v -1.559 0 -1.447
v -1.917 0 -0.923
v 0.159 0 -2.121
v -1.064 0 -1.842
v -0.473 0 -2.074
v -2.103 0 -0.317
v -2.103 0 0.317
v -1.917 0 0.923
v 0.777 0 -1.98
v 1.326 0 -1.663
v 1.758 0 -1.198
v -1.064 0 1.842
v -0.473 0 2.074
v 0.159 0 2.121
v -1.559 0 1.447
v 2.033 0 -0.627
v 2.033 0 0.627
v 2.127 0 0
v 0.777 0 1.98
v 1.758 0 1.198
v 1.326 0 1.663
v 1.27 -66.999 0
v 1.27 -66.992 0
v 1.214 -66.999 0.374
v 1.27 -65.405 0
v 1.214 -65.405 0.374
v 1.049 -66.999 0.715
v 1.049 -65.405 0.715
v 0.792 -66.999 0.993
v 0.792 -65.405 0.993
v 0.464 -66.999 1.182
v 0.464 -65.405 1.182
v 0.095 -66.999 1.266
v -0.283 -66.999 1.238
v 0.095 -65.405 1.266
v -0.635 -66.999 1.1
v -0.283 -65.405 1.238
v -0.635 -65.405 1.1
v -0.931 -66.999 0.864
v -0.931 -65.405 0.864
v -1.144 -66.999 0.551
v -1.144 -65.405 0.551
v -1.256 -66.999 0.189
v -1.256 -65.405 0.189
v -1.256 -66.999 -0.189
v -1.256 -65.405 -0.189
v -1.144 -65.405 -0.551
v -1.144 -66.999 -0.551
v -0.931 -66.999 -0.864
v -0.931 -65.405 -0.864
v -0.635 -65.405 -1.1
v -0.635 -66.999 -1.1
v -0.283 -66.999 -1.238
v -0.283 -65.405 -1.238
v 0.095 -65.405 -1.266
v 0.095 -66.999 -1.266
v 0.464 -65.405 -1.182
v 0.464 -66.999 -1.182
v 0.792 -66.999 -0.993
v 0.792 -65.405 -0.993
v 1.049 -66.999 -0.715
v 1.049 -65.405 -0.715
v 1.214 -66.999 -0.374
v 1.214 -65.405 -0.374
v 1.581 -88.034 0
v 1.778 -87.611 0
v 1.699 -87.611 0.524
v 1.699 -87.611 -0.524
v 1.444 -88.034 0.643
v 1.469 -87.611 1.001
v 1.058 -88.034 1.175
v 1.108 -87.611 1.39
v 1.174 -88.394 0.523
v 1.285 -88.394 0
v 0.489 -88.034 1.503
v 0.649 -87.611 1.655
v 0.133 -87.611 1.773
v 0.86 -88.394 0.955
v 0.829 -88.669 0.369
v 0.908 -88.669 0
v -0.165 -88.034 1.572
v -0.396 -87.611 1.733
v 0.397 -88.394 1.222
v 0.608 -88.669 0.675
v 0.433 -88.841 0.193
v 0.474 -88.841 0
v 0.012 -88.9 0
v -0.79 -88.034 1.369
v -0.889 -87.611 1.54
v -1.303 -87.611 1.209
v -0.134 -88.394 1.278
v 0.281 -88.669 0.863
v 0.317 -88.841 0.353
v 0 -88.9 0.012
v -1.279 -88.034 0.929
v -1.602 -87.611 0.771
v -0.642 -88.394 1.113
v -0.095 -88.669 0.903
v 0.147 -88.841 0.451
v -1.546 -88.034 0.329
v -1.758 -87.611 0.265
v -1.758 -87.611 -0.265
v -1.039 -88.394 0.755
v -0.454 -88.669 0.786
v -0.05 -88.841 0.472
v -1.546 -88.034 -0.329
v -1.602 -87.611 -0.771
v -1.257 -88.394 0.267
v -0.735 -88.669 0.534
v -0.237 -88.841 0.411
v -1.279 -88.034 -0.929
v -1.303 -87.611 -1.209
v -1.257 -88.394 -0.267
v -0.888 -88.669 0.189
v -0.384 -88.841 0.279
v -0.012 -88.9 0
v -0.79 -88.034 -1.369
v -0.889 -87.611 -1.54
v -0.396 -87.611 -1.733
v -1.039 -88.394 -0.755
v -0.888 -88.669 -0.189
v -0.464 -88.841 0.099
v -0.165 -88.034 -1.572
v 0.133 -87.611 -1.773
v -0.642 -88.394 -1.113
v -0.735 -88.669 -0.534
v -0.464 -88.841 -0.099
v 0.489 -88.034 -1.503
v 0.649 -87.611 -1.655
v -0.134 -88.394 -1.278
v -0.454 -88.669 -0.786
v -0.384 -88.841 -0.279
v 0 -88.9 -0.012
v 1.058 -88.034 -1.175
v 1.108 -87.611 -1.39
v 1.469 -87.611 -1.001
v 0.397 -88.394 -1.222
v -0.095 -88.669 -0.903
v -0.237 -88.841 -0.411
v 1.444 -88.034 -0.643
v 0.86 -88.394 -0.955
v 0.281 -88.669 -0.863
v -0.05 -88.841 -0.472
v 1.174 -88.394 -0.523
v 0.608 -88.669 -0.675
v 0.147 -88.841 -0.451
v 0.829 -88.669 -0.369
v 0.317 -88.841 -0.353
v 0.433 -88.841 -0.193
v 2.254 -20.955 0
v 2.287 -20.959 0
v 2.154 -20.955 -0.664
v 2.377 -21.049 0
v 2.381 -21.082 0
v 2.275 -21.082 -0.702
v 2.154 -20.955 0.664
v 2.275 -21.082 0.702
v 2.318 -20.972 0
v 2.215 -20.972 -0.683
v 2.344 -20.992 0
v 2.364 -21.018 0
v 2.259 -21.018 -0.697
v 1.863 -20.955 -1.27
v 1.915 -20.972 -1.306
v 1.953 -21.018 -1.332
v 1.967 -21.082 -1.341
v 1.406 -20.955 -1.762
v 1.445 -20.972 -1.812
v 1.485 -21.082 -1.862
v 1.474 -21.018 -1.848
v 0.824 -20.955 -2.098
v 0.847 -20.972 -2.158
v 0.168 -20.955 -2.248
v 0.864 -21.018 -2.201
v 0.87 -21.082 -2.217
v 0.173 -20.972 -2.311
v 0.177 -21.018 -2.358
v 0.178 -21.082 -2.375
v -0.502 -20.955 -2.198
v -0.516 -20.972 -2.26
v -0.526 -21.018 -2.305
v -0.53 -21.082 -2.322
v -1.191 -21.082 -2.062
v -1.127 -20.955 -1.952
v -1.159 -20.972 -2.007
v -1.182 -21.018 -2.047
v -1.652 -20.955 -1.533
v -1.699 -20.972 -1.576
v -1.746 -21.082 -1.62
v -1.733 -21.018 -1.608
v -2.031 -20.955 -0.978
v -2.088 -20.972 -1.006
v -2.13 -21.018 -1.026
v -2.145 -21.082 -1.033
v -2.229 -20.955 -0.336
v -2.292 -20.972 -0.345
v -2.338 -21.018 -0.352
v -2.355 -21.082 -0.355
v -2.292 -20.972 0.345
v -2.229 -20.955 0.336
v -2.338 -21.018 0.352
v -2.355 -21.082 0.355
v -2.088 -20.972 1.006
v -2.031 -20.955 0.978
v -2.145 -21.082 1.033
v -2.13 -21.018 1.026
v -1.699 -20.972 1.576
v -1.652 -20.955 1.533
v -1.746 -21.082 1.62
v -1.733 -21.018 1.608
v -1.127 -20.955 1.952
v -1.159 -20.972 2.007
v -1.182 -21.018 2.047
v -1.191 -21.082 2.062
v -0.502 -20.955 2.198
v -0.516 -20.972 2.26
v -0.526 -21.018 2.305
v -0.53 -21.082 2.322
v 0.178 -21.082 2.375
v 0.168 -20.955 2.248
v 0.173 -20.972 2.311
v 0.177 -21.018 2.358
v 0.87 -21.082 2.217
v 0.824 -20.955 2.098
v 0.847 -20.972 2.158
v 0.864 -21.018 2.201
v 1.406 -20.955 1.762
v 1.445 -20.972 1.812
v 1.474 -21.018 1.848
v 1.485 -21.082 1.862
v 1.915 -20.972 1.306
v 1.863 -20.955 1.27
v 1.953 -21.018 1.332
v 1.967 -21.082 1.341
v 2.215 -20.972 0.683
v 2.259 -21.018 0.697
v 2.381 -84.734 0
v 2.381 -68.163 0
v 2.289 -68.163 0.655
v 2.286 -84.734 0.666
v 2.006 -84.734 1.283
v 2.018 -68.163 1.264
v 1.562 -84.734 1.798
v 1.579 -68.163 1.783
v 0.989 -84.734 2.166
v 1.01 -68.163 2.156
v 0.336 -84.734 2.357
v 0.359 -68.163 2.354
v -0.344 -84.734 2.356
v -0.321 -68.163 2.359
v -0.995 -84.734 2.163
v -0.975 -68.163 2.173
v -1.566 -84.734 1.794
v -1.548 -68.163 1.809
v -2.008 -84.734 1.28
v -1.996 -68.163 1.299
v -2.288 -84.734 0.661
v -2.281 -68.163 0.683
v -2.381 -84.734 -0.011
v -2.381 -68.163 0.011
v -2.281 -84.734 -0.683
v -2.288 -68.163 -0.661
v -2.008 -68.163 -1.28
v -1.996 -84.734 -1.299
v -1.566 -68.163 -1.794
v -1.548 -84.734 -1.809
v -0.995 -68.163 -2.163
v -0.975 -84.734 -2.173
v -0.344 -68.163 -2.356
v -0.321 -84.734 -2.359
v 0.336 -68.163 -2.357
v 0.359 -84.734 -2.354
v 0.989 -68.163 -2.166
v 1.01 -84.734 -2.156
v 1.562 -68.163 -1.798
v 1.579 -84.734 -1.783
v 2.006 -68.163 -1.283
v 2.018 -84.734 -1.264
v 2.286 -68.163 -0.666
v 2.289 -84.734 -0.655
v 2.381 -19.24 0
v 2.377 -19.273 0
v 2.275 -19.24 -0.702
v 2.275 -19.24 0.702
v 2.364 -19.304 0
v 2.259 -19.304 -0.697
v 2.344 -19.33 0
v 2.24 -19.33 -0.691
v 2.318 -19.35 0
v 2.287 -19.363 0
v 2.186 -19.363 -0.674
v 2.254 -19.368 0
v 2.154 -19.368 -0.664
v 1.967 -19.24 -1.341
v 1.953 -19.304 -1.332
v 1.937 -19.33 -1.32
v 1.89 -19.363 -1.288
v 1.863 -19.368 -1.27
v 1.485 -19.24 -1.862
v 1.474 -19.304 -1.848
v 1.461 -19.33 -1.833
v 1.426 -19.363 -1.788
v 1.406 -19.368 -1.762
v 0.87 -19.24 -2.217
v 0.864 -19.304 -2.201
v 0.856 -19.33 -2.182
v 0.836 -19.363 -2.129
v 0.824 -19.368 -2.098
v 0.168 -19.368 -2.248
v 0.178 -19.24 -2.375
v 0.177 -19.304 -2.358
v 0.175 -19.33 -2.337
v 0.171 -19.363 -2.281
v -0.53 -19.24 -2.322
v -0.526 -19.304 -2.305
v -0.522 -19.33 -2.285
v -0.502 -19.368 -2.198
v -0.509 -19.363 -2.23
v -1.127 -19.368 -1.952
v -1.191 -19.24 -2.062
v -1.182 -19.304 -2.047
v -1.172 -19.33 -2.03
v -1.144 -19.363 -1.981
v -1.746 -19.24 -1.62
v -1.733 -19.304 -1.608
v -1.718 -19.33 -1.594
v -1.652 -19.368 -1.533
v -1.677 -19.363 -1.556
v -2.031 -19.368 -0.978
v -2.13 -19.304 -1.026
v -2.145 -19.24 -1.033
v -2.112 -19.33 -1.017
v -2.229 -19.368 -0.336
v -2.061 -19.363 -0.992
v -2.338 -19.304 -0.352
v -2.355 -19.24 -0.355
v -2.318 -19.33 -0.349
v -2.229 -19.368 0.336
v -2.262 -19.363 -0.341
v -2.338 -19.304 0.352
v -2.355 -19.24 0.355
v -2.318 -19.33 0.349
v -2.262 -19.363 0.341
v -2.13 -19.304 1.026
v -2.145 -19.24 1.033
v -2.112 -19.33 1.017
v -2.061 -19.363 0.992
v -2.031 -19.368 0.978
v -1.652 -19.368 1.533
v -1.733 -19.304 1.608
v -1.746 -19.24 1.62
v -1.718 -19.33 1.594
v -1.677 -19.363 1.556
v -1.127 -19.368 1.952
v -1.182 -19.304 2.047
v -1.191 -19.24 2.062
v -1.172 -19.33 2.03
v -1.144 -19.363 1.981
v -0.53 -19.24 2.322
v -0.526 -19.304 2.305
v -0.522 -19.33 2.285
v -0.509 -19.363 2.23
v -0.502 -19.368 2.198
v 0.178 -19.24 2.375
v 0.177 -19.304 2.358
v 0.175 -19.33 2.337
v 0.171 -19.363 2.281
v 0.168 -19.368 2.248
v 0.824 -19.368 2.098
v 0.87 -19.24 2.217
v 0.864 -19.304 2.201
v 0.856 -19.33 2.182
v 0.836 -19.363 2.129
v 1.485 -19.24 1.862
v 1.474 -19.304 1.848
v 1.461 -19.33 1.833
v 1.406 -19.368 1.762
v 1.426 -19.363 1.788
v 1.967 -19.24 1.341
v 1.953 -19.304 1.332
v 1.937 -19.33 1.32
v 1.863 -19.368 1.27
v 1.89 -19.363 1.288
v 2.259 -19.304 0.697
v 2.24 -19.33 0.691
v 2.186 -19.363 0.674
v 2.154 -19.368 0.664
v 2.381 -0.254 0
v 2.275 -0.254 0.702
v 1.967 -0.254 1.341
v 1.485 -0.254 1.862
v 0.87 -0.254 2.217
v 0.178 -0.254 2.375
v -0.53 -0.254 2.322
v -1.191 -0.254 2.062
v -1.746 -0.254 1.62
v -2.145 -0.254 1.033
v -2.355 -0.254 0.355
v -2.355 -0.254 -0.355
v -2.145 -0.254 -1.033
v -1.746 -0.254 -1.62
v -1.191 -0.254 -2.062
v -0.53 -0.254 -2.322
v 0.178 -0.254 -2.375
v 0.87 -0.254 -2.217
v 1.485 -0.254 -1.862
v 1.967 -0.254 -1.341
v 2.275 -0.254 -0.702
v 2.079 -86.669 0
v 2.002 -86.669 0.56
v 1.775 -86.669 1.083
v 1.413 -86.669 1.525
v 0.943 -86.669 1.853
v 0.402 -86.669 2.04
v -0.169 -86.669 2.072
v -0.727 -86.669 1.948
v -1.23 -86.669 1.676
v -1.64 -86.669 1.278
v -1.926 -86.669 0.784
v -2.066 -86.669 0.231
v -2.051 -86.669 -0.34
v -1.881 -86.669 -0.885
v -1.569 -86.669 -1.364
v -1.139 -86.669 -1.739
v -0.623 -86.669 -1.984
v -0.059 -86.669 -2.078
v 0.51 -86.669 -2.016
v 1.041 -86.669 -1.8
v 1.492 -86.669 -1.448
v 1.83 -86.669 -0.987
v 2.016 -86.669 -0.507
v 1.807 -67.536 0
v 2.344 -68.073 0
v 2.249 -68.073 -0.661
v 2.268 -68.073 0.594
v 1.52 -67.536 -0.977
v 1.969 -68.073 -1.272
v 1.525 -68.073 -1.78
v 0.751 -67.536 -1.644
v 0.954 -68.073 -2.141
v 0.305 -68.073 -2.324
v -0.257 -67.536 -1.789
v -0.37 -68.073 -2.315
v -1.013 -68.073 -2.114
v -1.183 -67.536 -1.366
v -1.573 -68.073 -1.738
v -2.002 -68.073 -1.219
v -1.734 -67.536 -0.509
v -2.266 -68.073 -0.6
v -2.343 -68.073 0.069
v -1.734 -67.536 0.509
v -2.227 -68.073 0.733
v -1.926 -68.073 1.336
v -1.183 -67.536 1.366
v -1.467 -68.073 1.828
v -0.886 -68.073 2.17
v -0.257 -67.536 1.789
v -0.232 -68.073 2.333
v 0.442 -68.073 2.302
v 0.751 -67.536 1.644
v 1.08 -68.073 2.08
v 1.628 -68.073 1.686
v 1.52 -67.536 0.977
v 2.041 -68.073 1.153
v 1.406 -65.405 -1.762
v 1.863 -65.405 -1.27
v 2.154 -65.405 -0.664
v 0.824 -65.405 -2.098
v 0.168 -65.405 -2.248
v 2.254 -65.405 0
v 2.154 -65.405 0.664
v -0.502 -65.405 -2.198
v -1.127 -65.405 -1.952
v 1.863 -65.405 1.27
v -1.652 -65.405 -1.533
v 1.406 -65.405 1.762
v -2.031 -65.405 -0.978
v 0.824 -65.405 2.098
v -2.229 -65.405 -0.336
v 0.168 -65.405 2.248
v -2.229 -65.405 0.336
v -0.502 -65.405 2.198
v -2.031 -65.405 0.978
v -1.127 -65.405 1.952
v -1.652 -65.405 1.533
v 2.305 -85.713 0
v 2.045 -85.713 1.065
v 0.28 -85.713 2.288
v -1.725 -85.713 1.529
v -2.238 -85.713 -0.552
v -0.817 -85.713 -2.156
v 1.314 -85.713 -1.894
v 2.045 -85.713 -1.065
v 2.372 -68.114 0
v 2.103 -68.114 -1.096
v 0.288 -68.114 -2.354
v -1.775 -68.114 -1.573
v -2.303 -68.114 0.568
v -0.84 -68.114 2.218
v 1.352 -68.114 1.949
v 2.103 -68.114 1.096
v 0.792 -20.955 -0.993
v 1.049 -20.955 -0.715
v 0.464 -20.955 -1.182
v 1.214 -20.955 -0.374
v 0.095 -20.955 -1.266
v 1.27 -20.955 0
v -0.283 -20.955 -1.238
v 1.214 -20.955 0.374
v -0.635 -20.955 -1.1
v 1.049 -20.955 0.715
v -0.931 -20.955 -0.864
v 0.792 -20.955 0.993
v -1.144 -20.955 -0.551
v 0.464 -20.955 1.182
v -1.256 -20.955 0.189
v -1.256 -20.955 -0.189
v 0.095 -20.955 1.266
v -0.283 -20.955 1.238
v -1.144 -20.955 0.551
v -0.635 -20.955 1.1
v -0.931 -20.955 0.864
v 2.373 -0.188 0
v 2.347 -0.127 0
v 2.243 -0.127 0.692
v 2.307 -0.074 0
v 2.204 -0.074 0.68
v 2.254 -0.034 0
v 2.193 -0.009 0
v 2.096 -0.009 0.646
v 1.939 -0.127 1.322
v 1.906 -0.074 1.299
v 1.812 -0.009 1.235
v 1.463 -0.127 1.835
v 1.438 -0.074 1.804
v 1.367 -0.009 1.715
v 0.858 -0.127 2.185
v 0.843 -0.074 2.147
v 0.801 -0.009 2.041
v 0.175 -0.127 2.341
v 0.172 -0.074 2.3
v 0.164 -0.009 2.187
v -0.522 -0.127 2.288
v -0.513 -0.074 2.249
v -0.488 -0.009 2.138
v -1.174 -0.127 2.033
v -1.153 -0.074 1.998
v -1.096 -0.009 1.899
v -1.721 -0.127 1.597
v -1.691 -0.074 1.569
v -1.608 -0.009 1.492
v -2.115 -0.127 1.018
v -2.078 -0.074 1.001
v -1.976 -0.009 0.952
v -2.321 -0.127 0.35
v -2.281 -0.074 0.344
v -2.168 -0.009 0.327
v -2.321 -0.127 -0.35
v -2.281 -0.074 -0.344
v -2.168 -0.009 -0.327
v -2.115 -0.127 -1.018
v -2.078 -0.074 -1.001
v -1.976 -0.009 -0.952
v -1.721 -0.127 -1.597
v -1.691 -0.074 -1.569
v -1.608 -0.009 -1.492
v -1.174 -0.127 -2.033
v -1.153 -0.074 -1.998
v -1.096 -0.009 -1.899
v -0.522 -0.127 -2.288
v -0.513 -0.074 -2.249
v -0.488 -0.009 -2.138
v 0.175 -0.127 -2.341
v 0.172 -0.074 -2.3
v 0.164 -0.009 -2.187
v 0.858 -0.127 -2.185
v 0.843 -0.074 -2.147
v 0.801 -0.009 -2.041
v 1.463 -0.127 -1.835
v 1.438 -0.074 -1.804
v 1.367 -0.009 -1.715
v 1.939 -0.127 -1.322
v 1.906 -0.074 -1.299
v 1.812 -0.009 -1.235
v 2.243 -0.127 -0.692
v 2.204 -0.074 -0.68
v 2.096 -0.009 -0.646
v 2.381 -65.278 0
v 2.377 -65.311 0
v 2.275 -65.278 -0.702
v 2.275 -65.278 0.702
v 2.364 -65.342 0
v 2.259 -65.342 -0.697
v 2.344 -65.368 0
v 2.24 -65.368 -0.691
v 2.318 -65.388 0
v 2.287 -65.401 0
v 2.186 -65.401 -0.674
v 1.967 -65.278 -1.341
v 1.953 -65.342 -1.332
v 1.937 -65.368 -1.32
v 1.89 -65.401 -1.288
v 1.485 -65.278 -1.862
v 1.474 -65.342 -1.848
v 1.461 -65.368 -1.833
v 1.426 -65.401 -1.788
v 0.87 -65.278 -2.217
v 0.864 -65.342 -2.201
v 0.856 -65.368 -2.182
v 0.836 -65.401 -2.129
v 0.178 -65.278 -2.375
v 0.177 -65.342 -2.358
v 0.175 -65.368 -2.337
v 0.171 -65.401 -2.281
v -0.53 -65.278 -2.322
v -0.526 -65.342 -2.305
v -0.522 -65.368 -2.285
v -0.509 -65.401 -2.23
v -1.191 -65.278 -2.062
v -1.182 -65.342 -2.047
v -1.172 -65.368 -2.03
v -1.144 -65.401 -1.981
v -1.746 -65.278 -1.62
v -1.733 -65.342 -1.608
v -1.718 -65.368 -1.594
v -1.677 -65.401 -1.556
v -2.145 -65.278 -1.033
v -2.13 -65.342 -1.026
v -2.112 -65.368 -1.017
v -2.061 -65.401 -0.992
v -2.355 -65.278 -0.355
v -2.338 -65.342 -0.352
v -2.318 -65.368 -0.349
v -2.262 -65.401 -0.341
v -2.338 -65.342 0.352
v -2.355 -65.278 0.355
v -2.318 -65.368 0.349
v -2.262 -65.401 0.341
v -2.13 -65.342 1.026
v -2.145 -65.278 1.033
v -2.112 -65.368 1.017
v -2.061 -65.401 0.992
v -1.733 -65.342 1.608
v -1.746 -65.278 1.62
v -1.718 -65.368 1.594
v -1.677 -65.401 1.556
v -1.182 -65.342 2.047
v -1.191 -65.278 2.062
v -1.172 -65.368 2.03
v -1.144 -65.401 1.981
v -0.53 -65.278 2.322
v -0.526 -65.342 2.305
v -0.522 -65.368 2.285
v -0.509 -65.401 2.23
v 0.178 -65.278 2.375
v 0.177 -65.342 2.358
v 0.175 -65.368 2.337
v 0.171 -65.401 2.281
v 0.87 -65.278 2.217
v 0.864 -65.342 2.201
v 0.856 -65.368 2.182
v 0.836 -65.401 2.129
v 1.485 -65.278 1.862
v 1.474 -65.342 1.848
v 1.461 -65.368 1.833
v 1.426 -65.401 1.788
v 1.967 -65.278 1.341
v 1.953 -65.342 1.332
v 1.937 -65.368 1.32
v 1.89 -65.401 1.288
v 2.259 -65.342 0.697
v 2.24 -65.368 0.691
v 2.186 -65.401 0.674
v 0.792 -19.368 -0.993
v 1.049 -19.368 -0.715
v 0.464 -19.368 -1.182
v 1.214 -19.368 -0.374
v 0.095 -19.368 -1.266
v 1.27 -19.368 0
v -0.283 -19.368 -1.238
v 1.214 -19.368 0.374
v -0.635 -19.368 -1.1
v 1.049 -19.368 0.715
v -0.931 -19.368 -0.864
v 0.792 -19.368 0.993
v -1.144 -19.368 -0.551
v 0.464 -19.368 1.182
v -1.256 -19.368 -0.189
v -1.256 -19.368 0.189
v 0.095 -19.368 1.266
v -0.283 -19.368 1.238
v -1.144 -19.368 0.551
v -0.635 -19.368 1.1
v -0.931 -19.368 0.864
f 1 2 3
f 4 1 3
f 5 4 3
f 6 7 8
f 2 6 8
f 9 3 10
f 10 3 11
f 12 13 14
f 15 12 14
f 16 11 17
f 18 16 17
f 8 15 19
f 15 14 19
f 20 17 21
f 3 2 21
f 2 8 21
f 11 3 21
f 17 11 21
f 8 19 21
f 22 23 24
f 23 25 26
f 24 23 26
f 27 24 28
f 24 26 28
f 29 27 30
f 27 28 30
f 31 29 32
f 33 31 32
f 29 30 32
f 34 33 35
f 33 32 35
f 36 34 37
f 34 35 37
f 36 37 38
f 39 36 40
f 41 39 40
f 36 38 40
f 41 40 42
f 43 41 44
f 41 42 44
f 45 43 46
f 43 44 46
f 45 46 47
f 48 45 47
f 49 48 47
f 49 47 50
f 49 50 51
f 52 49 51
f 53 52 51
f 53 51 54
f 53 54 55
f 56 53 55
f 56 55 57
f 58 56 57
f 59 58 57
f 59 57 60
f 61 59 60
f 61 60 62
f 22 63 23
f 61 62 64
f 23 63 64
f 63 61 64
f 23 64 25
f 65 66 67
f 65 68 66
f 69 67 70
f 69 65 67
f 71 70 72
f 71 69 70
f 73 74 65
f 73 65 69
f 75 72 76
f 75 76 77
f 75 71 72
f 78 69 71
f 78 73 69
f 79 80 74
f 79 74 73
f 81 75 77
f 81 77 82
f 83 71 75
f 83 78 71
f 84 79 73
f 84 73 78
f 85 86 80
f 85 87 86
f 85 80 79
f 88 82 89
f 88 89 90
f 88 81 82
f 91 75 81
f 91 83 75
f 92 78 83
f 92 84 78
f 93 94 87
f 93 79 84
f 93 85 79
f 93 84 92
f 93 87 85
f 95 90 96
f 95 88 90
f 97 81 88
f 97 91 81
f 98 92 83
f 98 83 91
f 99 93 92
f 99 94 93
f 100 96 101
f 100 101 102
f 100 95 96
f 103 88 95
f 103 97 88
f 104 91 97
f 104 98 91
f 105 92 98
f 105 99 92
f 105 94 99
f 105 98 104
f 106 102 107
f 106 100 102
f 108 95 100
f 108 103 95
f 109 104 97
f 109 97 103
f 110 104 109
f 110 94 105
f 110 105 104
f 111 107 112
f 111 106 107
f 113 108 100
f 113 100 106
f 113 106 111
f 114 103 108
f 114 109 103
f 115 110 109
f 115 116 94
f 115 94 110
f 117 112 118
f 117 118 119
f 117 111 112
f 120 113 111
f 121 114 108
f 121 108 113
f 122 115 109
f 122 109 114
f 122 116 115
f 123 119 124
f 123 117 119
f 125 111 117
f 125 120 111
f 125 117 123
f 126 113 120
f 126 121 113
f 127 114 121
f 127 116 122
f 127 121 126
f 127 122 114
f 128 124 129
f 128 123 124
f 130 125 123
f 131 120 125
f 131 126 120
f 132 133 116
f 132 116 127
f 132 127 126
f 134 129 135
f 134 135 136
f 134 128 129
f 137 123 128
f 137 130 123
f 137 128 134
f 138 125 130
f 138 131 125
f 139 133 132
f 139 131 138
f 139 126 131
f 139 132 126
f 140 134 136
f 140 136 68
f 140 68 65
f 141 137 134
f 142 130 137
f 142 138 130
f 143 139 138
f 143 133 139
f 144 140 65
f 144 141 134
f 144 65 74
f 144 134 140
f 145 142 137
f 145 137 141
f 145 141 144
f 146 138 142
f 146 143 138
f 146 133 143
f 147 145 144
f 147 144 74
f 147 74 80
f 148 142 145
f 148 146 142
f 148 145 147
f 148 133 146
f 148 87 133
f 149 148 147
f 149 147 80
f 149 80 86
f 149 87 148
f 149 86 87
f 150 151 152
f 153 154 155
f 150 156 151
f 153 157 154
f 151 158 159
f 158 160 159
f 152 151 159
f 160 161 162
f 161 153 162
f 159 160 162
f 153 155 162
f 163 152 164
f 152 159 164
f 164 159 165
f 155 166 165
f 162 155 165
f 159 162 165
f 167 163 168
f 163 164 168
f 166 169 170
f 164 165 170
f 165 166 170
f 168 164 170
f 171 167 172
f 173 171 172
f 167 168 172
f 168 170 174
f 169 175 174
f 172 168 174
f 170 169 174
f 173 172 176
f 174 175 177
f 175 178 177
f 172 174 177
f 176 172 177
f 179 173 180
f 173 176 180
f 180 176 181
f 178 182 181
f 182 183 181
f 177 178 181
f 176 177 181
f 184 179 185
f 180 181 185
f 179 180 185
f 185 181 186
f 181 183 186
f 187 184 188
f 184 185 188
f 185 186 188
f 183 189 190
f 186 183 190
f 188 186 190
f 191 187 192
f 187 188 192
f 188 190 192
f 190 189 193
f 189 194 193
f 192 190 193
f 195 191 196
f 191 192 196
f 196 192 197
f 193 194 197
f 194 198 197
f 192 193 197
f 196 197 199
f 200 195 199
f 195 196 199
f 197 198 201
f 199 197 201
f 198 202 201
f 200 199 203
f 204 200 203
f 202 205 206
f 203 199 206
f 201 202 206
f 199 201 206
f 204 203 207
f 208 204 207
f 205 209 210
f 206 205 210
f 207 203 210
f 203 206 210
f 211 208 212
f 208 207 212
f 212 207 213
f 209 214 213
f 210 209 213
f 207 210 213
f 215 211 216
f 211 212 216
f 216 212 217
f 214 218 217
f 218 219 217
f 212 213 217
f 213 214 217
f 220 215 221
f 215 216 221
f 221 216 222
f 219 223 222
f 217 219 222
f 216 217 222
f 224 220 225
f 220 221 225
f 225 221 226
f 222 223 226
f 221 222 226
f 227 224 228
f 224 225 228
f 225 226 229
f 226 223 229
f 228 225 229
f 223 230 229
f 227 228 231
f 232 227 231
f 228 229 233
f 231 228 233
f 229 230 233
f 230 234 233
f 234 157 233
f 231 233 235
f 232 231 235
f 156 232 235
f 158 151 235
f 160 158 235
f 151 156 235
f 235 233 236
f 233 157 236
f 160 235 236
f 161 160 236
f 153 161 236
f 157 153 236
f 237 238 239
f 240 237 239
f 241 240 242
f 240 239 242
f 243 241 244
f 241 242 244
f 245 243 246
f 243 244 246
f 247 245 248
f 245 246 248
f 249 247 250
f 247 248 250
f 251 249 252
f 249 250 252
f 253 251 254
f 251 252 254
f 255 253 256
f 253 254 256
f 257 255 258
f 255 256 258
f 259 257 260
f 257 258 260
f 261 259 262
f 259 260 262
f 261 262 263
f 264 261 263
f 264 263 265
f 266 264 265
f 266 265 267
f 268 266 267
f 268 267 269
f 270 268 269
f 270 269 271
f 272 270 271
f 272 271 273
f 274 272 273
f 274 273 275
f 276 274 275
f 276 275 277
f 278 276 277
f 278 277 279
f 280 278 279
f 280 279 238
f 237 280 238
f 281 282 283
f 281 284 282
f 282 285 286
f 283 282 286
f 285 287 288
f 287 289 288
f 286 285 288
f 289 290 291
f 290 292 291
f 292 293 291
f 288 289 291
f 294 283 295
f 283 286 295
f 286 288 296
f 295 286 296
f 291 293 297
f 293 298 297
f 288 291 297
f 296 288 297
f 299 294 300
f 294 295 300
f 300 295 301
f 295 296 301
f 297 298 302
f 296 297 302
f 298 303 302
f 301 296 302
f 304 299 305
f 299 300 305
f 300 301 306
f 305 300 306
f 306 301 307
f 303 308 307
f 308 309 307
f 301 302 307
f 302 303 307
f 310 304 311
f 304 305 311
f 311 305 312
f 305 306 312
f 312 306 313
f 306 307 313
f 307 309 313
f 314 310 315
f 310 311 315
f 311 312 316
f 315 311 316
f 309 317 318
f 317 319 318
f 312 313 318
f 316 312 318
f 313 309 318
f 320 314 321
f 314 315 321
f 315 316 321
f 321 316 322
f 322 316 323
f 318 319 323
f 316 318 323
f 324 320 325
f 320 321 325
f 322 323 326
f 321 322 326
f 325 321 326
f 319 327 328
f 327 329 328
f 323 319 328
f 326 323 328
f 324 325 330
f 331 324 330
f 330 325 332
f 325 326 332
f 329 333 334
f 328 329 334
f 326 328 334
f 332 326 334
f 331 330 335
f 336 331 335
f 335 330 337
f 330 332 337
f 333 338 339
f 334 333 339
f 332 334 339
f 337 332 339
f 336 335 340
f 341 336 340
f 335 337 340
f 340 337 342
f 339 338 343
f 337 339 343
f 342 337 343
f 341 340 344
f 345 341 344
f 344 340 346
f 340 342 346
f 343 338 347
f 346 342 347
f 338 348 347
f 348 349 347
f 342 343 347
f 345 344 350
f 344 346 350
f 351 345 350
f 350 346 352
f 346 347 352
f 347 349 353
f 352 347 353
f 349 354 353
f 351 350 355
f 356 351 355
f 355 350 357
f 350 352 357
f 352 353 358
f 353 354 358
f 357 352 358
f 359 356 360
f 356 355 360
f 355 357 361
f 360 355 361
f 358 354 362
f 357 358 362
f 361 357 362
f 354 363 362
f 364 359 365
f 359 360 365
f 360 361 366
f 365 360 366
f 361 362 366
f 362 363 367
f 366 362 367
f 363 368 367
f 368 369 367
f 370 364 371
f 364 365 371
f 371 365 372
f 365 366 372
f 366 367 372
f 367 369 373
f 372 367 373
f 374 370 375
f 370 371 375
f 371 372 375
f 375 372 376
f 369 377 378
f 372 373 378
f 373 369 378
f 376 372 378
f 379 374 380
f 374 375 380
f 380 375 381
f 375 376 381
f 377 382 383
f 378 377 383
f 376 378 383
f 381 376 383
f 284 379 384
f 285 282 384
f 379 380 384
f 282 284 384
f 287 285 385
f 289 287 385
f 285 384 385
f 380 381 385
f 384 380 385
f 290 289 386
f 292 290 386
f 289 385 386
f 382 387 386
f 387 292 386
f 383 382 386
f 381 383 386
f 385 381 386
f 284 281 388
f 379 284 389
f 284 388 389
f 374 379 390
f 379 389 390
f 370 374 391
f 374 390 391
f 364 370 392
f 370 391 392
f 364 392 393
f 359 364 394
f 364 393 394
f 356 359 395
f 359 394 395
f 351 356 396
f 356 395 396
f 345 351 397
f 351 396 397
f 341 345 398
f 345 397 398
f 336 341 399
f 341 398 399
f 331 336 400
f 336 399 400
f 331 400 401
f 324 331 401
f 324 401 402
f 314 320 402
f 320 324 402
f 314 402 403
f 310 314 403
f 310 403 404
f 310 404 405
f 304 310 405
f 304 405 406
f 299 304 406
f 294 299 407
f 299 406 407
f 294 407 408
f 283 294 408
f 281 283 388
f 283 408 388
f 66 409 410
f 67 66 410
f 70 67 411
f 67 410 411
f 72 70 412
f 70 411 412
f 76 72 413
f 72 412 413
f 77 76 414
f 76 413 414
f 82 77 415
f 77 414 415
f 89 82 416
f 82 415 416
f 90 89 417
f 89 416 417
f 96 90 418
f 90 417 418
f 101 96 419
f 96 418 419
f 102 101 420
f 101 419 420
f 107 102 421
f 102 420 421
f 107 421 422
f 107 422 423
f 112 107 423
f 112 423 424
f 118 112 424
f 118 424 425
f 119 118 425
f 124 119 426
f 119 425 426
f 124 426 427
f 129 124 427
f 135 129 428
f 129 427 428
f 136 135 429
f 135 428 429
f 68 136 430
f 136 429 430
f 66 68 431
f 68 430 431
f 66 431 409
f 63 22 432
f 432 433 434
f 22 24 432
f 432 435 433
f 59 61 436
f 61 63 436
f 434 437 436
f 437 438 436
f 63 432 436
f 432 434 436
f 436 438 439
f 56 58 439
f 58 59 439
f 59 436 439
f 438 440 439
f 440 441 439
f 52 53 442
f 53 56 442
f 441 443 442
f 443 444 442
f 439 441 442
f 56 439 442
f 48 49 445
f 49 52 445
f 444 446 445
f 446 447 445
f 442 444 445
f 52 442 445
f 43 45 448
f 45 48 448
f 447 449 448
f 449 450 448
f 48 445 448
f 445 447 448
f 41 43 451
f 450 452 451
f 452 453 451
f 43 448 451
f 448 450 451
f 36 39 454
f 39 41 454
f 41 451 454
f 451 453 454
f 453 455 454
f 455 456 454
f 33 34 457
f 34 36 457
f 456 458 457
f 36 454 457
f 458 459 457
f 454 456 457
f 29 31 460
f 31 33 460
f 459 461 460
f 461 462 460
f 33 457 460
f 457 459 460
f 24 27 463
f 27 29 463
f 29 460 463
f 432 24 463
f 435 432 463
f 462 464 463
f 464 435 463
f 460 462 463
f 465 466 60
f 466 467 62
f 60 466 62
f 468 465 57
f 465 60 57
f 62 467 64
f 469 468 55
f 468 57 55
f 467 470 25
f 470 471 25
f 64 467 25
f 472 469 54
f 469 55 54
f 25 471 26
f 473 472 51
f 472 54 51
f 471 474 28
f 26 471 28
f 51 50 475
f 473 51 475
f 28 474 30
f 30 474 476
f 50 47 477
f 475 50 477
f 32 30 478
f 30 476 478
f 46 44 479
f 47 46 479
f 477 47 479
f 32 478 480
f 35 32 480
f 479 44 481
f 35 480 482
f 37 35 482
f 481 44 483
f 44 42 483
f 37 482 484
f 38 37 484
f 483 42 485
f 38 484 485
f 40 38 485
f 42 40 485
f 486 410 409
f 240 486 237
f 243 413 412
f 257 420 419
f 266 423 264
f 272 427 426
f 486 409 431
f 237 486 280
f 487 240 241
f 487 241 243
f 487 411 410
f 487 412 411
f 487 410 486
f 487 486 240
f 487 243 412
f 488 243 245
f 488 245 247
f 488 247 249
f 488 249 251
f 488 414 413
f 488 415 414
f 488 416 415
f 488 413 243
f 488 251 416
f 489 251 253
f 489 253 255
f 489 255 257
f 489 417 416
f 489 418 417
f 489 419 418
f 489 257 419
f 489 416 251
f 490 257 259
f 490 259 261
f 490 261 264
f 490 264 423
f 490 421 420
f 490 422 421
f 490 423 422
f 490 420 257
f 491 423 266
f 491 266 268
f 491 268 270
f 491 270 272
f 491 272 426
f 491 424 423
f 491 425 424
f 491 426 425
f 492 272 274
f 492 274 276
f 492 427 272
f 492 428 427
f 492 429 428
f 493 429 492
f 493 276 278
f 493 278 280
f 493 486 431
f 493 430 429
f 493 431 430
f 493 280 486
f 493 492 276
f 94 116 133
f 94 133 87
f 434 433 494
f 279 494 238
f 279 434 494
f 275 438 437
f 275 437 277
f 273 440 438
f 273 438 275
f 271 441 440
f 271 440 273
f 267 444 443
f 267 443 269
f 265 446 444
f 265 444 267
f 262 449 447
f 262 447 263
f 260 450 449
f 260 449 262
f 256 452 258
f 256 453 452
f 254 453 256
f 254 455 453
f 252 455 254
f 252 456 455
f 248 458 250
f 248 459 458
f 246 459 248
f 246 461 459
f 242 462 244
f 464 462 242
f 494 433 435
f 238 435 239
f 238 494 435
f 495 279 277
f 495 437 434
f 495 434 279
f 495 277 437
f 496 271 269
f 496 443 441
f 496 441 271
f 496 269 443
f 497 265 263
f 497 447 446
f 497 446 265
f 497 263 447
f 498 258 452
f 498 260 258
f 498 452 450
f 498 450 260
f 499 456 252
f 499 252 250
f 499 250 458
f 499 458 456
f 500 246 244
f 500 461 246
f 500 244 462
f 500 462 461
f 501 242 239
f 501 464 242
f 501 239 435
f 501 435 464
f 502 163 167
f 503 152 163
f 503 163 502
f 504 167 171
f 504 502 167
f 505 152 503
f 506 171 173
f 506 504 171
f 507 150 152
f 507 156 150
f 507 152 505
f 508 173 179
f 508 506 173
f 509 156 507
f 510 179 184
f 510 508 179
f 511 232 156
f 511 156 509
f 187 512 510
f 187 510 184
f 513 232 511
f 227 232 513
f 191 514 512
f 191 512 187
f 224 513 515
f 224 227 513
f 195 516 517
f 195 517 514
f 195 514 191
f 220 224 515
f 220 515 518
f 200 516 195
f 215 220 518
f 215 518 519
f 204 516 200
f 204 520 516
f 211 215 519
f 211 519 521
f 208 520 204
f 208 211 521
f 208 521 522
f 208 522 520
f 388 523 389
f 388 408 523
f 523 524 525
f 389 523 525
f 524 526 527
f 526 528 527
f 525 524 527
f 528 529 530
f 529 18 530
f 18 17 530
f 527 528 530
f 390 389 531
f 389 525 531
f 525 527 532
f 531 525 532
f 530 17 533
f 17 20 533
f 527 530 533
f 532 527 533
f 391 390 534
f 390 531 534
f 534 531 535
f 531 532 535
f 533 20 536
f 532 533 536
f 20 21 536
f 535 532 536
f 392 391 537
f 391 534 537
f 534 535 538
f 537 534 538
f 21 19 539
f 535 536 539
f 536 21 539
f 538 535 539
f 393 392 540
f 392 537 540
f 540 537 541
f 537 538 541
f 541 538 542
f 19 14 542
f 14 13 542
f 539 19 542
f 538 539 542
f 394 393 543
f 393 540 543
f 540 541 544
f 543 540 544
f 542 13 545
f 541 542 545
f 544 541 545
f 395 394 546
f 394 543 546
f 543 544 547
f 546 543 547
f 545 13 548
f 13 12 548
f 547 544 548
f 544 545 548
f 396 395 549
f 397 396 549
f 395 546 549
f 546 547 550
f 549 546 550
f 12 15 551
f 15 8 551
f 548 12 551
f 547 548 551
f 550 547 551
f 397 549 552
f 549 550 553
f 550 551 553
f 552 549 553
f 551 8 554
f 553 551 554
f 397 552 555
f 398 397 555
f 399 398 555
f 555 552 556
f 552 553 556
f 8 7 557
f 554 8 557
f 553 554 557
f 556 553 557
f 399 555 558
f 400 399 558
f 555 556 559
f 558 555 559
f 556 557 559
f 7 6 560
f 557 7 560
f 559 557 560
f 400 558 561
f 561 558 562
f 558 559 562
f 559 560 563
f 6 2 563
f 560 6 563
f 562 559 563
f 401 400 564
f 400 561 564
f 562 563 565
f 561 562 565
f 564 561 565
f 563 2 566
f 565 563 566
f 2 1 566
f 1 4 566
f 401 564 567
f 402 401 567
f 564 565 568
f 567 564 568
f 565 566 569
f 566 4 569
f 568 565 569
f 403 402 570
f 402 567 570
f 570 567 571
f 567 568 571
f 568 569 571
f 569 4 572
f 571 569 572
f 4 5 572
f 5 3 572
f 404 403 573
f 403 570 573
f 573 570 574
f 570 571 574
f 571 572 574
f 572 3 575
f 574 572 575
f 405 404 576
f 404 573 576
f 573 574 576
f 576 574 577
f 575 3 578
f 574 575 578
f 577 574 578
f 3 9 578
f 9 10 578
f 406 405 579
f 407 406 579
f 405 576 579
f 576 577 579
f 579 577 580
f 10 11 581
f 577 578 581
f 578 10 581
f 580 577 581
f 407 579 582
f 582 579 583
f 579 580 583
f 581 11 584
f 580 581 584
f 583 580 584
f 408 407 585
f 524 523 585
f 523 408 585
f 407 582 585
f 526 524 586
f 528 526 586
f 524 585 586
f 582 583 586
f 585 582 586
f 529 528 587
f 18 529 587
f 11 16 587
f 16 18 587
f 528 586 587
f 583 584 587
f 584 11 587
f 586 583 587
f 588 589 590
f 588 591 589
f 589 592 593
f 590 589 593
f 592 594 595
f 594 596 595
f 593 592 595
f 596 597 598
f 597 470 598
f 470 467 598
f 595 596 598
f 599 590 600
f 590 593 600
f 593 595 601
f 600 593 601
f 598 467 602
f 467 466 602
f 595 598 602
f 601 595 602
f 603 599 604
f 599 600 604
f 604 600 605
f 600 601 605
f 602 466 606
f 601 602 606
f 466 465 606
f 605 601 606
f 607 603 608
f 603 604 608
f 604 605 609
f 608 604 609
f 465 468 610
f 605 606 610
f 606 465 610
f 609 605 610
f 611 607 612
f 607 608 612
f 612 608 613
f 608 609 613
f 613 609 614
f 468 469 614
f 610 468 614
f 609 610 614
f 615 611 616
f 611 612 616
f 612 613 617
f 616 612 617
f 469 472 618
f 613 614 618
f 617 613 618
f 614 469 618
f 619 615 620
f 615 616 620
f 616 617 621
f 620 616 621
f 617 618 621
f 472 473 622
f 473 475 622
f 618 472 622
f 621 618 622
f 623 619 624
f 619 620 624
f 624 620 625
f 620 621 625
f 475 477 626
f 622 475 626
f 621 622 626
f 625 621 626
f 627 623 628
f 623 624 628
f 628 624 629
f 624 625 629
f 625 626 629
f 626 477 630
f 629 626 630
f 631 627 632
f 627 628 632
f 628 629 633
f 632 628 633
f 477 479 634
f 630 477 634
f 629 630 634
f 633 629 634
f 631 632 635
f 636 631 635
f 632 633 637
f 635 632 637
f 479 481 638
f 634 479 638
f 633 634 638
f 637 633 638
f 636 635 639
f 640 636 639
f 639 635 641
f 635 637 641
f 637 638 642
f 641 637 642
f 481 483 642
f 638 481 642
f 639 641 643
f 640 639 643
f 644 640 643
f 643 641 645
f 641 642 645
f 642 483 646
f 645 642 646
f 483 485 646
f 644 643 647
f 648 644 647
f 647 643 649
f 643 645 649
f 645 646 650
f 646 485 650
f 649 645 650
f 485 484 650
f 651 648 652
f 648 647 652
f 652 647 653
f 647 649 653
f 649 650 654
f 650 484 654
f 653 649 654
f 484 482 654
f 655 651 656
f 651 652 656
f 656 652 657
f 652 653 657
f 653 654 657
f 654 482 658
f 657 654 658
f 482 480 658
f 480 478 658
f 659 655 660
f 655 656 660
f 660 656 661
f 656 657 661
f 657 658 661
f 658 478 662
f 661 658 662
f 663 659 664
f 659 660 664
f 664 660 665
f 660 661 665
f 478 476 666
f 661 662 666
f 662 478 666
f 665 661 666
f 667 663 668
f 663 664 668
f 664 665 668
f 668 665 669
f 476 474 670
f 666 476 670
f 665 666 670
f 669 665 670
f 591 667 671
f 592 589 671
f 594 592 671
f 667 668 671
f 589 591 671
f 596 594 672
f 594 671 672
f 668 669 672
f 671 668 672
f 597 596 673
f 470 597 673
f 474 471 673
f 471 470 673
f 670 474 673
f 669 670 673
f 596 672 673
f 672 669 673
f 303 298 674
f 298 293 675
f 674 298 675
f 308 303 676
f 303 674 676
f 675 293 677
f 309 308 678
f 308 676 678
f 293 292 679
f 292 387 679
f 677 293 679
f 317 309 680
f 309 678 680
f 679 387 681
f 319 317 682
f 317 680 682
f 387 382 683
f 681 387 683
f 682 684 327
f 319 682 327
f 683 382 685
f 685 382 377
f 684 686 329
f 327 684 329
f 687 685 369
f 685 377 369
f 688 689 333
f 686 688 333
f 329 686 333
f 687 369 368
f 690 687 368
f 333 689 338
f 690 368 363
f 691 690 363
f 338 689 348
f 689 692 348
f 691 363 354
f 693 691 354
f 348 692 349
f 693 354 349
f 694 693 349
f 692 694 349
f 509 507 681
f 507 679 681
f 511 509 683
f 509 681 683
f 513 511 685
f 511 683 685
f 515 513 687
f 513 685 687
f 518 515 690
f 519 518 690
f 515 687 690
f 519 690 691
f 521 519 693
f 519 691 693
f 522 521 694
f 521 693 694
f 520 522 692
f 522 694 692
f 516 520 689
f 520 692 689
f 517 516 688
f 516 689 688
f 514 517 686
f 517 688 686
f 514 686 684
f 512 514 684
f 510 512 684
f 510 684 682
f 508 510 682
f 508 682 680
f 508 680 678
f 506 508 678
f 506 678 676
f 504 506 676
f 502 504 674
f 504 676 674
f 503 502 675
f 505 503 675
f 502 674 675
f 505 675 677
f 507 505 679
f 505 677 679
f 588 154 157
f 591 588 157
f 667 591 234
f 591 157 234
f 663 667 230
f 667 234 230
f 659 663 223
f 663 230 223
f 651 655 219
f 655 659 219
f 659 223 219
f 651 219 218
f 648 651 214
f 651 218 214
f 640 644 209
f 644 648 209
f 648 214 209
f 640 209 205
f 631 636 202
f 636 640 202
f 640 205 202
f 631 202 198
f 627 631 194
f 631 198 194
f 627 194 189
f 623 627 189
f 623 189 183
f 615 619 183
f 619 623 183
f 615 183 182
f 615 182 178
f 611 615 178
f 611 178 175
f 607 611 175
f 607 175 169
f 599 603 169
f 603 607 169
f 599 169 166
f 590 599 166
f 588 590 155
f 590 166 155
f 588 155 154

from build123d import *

# Parameters (mm, degrees)
F0_R        = 2.38125
F1_DEPTH    = 88.9
F2_SIZE2    = 3.175
F2_SIZE     = 1.016
F3_R        = 1.8542
F4_R        = 6.35
F5_R        = 0.254
F6_W        = 3.5311071049
F6_H        = 1.5875
F8_S5_R     = 1.27
F8_T6_DEPTH = 5
F9_R        = 0.127


# Not quite as in the source:
# - a fillet or chamfer that OpenCascade refuses, or shapes differently, is made with other operations: its cross-section is extruded or revolved along the edge and cut away or added


with BuildPart() as f1:
    # F0 (on Front) → F1 (new body)
    with BuildSketch(Plane.XZ):
        Circle(F0_R)
    extrude(amount=F1_DEPTH)

    # F2
    f2_edges = [f1.edges().sort_by_distance(p)[0] for p in [
        (-2.38125, -88.9, 0),
    ]]
    f2_side = f1.faces().sort_by_distance((0, -88.9, 0))[0]
    chamfer(f2_edges, length=F2_SIZE, length2=F2_SIZE2, reference=f2_side)

    # F3
    f3_edges = [f1.edges().sort_by_distance(p)[0] for p in [
        (-1.36525, -88.9, 0),
    ]]
    fillet(f3_edges, radius=F3_R)

    # F4
    f4_edges = [f1.edges().sort_by_distance(p)[0] for p in [
        (-2.38125, -85.725, 0),
    ]]
    fillet(f4_edges, radius=F4_R)

    # F5
    f5_edges = [f1.edges().sort_by_distance(p)[0] for p in [
        (-2.38125, 0, 0),
    ]]
    fillet(f5_edges, radius=F5_R)

    # F6 (on Top) → F7 (revolve, cut)
    with BuildSketch(Plane.XY):
        with Locations((3.0355535524, -20.16125)):
            Rectangle(F6_W, F6_H)
        with Locations((3.0355535524, -66.19875)):
            Rectangle(F6_W, F6_H)
    revolve(axis=Axis((0, -11.8038663641, 0), (0, -1, 0)), mode=Mode.SUBTRACT)

    # F8: chamfer of 1.1176 on 1 edges, made by hand


with BuildPart() as f8_tool2:
    # F8_s3 → F8_t4 (revolve)
    with BuildSketch(Plane.XY):
        Polygon((1.26365, -66.9925), (2.38125, -68.1101), (2.38125, -66.9925), align=None)
    revolve(axis=Axis((0, -66.9925, 0), (0, 1, 0)))

    # F8_s5 → F8_t6 (cut, symmetric)
    with BuildSketch(Plane.XZ.offset(67.6)):
        Circle(F8_S5_R)
    extrude(amount=F8_T6_DEPTH, both=True, mode=Mode.SUBTRACT)


with BuildPart() as f1_1:
    add(f1.part)

    # F8_t1: cut F8_tool2
    add(f8_tool2.part, mode=Mode.SUBTRACT)

    # F9
    f9_edges = [f1_1.edges().sort_by_distance(p)[0] for p in [
        (-2.38125, -19.3675, 0),
        (-2.38125, -20.955, 0),
        (-2.38125, -65.405, 0),
        (-2.38125, -68.1101, 0),
    ]]
    fillet(f9_edges, radius=F9_R)


solid = f1_1.part
